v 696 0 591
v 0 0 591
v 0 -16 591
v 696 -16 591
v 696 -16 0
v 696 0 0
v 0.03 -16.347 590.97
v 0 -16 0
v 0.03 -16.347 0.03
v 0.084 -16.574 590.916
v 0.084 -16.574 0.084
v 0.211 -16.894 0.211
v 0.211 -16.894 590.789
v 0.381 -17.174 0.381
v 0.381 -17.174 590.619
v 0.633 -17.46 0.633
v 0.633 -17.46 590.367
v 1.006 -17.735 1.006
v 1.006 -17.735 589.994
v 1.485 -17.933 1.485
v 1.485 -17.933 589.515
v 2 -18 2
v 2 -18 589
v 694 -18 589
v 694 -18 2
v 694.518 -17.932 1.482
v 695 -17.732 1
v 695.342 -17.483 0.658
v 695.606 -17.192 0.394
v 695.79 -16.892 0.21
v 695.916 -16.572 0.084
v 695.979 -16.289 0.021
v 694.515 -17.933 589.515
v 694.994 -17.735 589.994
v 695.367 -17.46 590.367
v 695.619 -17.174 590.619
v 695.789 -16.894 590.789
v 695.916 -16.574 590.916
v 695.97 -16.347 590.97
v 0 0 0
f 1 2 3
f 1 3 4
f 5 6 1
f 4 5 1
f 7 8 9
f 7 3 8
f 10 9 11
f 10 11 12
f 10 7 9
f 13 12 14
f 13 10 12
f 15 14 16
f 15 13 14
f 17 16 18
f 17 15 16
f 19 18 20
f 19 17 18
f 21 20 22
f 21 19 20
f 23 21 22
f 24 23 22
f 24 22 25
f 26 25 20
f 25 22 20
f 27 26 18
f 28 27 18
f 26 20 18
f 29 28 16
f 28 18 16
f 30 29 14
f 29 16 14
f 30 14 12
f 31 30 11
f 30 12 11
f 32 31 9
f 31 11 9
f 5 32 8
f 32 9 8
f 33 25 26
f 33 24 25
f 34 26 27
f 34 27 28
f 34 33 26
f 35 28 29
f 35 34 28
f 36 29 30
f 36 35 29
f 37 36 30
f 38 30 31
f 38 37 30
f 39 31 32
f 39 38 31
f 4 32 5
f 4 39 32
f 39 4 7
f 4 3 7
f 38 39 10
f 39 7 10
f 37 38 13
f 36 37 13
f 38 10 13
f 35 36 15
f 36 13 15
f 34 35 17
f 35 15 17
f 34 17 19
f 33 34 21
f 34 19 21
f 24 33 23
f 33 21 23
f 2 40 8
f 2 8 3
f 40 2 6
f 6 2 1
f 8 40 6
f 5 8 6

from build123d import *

# Parameters (mm, degrees)
F0_W     = 53.3562451601
F0_H     = 46.8972101808
F1_DEPTH = 18
F2_DEPTH = 696
F3_DEPTH = 596
F4_DEPTH = 5
F5_R     = 2


with BuildPart() as f1:
    # F0 (on Front) → F1 (new body)
    with BuildSketch(Plane.XZ):
        with Locations((26.6781225801, 23.4486050904)):
            Rectangle(F0_W, F0_H)
    extrude(amount=F1_DEPTH)

    # F2 (add): a face of the model
    f2_faces = [f1.faces().sort_by_distance(p)[0] for p in [
        (0, -9, 23.4486050904),
    ]]
    extrude(f2_faces, amount=-F2_DEPTH)

    # F3 (add): a face of the model
    f3_faces = [f1.faces().sort_by_distance(p)[0] for p in [
        (348, -9, 0),
    ]]
    extrude(f3_faces, amount=-F3_DEPTH)

    # F4 (cut): a face of the model
    f4_faces = [f1.faces().sort_by_distance(p)[0] for p in [
        (348, -9, 596),
    ]]
    extrude(f4_faces, amount=-F4_DEPTH, mode=Mode.SUBTRACT)

    # F5
    f5_edges = [f1.edges().sort_by_distance(p)[0] for p in [
        (0, -18, 295.5),
        (348, -18, 591),
        (696, -18, 295.5),
        (348, -18, 0),
    ]]
    fillet(f5_edges, radius=F5_R)


solid = f1.part
